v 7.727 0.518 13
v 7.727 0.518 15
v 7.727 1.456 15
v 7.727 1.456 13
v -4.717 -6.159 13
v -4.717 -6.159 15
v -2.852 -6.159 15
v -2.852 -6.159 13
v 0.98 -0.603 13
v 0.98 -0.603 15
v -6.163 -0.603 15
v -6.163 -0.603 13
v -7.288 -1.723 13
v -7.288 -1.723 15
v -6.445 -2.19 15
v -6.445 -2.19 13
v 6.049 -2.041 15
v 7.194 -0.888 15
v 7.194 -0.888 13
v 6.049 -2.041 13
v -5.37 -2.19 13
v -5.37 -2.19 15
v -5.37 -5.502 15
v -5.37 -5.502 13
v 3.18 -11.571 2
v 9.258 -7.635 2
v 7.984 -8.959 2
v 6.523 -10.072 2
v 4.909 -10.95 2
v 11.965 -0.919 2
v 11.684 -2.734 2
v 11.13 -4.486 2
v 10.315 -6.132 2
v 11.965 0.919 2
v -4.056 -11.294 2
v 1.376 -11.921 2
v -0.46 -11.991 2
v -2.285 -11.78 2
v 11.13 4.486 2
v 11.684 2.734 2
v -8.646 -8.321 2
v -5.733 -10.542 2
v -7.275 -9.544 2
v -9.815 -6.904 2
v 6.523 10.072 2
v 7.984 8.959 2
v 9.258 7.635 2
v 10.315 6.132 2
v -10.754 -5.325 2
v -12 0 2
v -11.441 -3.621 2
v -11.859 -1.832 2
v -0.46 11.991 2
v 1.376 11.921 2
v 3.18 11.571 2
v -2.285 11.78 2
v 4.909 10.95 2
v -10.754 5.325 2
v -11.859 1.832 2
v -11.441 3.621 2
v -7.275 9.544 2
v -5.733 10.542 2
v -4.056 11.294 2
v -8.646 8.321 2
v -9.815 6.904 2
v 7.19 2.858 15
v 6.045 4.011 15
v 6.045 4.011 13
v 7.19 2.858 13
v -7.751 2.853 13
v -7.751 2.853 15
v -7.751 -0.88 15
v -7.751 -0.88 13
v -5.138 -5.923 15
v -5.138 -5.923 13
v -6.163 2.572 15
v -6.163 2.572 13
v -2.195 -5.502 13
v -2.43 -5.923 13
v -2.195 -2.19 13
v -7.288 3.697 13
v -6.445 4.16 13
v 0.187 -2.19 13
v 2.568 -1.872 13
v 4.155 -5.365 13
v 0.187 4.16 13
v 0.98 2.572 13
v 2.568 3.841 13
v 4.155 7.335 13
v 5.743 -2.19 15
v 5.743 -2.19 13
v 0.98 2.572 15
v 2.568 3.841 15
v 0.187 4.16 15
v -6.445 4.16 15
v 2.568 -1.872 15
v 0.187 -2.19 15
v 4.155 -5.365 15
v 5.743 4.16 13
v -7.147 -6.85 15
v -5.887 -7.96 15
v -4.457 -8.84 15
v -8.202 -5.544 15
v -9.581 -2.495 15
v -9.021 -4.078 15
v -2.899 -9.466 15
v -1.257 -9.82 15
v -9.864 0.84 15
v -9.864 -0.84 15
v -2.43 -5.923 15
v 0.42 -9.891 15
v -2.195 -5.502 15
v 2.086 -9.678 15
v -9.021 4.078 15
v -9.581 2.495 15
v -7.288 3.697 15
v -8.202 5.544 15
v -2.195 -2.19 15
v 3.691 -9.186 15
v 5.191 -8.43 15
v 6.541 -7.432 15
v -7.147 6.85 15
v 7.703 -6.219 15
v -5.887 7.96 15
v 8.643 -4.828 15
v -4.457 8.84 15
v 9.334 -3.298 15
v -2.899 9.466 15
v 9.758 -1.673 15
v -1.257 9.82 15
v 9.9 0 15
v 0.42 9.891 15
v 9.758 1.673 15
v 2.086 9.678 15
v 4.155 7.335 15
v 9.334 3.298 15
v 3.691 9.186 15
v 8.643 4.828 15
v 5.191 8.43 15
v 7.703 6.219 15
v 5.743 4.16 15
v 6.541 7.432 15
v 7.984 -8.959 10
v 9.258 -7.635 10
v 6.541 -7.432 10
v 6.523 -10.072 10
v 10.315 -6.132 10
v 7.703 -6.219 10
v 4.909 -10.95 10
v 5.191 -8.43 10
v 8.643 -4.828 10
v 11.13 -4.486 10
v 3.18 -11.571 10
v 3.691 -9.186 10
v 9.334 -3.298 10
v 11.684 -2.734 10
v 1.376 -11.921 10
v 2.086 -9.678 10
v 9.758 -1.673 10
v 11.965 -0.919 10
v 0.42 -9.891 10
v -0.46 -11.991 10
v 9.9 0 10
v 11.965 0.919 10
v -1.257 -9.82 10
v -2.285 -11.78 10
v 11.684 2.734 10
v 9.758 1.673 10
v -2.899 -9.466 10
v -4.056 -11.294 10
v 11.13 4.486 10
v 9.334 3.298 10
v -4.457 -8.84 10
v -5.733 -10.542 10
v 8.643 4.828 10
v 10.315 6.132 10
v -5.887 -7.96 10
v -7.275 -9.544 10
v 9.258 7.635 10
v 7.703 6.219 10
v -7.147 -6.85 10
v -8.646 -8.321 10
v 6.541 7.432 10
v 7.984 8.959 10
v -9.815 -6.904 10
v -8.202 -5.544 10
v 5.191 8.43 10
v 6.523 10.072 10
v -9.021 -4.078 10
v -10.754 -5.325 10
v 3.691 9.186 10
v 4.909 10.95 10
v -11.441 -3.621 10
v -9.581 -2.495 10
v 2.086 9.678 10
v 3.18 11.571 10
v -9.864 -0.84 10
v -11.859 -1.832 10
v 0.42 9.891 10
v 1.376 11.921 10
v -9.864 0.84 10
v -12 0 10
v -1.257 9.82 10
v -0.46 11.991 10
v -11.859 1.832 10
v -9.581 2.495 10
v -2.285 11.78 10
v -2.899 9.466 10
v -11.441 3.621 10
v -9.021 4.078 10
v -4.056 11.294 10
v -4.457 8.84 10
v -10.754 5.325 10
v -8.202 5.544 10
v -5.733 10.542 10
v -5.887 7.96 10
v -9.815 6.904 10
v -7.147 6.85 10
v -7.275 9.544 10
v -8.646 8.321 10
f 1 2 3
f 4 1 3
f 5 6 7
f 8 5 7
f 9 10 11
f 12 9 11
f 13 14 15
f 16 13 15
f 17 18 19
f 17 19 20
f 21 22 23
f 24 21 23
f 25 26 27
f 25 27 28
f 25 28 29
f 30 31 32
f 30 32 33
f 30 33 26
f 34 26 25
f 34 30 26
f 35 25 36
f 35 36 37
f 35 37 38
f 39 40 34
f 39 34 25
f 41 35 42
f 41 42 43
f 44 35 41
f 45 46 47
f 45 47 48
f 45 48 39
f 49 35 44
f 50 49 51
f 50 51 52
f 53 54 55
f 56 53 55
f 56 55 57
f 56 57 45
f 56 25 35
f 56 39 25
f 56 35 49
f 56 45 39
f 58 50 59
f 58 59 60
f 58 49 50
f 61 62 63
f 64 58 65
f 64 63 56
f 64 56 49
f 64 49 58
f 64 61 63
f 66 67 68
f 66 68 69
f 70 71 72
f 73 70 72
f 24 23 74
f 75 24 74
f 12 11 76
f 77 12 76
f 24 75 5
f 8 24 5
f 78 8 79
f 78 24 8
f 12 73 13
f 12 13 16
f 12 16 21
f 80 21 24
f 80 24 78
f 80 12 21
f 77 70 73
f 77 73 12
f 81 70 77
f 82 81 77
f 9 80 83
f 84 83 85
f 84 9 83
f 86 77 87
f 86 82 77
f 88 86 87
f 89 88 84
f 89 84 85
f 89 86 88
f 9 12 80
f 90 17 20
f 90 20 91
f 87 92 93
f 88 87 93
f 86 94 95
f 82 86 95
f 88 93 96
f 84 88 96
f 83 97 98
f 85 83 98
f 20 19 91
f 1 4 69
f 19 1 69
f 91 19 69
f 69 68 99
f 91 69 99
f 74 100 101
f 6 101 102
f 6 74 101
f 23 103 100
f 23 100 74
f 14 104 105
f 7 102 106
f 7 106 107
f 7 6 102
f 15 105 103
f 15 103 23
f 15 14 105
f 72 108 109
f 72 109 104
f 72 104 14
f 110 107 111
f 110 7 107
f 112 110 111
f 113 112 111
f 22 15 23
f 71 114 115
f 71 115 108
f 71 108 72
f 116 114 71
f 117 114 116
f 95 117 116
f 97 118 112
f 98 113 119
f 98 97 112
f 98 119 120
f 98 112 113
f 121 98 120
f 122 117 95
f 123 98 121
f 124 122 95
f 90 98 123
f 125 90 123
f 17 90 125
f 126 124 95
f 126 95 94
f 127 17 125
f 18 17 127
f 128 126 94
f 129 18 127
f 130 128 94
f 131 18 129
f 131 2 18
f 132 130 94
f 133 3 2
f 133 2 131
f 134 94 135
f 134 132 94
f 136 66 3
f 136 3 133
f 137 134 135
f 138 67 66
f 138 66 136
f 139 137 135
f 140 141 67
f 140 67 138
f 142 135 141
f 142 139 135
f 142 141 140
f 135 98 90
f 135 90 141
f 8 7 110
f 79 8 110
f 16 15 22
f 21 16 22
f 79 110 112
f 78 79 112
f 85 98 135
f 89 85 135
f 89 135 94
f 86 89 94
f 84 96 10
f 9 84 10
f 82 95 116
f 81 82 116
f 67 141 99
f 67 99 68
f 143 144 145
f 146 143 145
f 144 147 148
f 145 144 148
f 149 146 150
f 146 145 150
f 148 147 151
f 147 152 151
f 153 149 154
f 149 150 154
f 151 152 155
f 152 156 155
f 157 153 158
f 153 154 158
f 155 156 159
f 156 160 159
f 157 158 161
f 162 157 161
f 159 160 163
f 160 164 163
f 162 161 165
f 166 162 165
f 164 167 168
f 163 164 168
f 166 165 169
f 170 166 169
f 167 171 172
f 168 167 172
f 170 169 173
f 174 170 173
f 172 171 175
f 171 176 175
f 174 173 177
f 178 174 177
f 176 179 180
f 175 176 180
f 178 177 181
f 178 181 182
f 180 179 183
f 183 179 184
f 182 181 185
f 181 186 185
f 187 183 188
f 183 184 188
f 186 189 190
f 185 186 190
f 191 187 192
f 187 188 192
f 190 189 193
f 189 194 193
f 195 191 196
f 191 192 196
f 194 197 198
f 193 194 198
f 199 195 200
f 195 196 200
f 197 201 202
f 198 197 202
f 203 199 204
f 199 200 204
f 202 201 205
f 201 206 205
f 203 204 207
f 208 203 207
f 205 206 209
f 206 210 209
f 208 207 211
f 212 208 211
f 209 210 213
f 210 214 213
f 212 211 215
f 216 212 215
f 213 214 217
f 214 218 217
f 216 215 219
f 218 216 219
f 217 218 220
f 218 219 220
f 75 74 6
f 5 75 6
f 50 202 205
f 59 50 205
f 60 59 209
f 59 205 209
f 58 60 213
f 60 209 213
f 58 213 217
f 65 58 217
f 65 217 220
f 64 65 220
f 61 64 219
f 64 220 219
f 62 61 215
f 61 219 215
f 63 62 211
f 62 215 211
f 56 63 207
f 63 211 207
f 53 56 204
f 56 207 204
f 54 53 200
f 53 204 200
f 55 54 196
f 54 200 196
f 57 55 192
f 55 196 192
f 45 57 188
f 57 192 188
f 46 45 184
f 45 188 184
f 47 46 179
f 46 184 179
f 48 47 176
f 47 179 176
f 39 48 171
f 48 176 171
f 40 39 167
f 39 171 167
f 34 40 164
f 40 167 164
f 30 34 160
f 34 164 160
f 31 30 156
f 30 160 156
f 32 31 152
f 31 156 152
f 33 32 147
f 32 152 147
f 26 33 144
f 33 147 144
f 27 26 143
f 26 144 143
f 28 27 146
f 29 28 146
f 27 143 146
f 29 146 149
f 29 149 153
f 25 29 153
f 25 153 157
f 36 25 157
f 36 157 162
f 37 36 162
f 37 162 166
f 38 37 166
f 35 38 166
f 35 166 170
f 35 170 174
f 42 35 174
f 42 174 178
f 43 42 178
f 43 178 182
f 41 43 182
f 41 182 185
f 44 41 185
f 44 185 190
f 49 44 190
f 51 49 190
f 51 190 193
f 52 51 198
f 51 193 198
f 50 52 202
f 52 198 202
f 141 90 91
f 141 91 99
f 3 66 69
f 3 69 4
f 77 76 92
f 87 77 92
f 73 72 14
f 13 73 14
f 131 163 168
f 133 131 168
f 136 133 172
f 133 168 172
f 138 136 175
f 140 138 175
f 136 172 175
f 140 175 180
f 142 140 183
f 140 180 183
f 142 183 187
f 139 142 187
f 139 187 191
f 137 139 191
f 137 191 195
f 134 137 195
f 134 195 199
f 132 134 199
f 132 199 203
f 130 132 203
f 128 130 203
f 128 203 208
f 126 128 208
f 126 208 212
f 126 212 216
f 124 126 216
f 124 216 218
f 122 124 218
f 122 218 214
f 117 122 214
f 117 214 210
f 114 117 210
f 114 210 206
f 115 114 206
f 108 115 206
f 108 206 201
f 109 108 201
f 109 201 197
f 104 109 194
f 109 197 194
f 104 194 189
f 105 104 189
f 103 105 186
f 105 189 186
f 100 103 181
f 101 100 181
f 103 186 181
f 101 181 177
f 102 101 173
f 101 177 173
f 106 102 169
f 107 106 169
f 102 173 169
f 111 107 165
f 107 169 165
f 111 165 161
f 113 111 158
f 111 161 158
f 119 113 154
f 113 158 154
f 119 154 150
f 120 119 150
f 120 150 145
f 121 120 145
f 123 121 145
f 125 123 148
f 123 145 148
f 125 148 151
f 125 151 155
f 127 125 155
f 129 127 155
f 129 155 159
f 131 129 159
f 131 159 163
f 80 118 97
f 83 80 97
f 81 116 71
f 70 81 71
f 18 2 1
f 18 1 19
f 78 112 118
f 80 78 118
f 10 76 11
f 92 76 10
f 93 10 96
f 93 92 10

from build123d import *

# Parameters (mm, degrees)
ESQUISSE1_R             = 9.9
BOSS_EXTRU_1_DEPTH      = 15
ENL_V_MAT_EXTRU_1_DEPTH = 2
ESQUISSE6_R             = 9.9
ENL_V_MAT_EXTRU_2_DEPTH = 10
ESQUISSE8_R             = 12
BOSS_EXTRU_2_DEPTH      = 8


with BuildPart() as part:
    # Esquisse1 → Boss.-Extru.1 (new body)
    with BuildSketch(Plane.XY):
        Circle(ESQUISSE1_R)
    extrude(amount=BOSS_EXTRU_1_DEPTH)

    # Esquisse4 → Enlèv. mat.-Extru.1 (cut)
    # profile 1 of 2: a face of its own
    with BuildSketch(Plane.XY.offset(15)):
        Polygon((0.186527371, 4.159848226), (-6.163470089, 4.159848226), (-6.444587129, 4.159848226), (-7.287953489, 3.696780826), (-7.750975169, 2.853399226), (-7.750975169, 2.572297426), (-7.750975169, -0.602651774), (-7.750975169, -0.879638774), (-7.287953489, -1.723020374), (-6.444587129, -2.190179714), (-6.163470089, -2.190179714), (-5.369725169, -2.190179714), (-5.369725169, -5.365174634), (-5.369725169, -5.501610734), (-5.138214329, -5.923278674), (-4.716531149, -6.158927174), (-4.575972629, -6.158927174), (-2.988475169, -6.158927174), (-2.852039069, -6.158927174), (-2.430371129, -5.923278674), (-2.194722629, -5.501610734), (-2.194722629, -5.365174634), (-2.194722629, -2.190179714), (0.186527371, -2.190179714), (4.155251971, -5.365174634), (4.155251971, 7.334797426), align=None)
        Polygon((2.567777371, -1.871854214), (0.980302771, -0.602651774), (-6.163470089, -0.602651774), (-6.163470089, 2.572297426), (0.980302771, 2.572297426), (2.567777371, 3.841484626), align=None, mode=Mode.SUBTRACT)
    # profile 2 of 2: a face of its own
    with BuildSketch(Plane.XY.offset(15)):
        Polygon((7.727126971, 0.984822826), (7.727126971, 0.517640626), (7.193879371, -0.887944574), (6.048745771, -2.041345874), (5.742802771, -2.190179714), (5.742802771, 4.159848226), (6.044630971, 4.011029626), (7.189764571, 2.857514026), (7.727126971, 1.456119826), align=None)
    extrude(amount=-ENL_V_MAT_EXTRU_1_DEPTH, mode=Mode.SUBTRACT)

    # Esquisse6 → Enlèv. mat.-Extru.2 (cut)
    with BuildSketch(Plane(origin=(0, 0, 0), x_dir=(-1, 0, 0), z_dir=(0, 0, -1))):
        Circle(ESQUISSE6_R)
    extrude(amount=-ENL_V_MAT_EXTRU_2_DEPTH, mode=Mode.SUBTRACT)

    # Esquisse8 → Boss.-Extru.2 (add)
    with BuildSketch(Plane(origin=(0, 0, 10), x_dir=(-1, 0, 0), z_dir=(0, 0, -1))):
        Circle(ESQUISSE8_R)
    extrude(amount=BOSS_EXTRU_2_DEPTH)


solid = part.part
